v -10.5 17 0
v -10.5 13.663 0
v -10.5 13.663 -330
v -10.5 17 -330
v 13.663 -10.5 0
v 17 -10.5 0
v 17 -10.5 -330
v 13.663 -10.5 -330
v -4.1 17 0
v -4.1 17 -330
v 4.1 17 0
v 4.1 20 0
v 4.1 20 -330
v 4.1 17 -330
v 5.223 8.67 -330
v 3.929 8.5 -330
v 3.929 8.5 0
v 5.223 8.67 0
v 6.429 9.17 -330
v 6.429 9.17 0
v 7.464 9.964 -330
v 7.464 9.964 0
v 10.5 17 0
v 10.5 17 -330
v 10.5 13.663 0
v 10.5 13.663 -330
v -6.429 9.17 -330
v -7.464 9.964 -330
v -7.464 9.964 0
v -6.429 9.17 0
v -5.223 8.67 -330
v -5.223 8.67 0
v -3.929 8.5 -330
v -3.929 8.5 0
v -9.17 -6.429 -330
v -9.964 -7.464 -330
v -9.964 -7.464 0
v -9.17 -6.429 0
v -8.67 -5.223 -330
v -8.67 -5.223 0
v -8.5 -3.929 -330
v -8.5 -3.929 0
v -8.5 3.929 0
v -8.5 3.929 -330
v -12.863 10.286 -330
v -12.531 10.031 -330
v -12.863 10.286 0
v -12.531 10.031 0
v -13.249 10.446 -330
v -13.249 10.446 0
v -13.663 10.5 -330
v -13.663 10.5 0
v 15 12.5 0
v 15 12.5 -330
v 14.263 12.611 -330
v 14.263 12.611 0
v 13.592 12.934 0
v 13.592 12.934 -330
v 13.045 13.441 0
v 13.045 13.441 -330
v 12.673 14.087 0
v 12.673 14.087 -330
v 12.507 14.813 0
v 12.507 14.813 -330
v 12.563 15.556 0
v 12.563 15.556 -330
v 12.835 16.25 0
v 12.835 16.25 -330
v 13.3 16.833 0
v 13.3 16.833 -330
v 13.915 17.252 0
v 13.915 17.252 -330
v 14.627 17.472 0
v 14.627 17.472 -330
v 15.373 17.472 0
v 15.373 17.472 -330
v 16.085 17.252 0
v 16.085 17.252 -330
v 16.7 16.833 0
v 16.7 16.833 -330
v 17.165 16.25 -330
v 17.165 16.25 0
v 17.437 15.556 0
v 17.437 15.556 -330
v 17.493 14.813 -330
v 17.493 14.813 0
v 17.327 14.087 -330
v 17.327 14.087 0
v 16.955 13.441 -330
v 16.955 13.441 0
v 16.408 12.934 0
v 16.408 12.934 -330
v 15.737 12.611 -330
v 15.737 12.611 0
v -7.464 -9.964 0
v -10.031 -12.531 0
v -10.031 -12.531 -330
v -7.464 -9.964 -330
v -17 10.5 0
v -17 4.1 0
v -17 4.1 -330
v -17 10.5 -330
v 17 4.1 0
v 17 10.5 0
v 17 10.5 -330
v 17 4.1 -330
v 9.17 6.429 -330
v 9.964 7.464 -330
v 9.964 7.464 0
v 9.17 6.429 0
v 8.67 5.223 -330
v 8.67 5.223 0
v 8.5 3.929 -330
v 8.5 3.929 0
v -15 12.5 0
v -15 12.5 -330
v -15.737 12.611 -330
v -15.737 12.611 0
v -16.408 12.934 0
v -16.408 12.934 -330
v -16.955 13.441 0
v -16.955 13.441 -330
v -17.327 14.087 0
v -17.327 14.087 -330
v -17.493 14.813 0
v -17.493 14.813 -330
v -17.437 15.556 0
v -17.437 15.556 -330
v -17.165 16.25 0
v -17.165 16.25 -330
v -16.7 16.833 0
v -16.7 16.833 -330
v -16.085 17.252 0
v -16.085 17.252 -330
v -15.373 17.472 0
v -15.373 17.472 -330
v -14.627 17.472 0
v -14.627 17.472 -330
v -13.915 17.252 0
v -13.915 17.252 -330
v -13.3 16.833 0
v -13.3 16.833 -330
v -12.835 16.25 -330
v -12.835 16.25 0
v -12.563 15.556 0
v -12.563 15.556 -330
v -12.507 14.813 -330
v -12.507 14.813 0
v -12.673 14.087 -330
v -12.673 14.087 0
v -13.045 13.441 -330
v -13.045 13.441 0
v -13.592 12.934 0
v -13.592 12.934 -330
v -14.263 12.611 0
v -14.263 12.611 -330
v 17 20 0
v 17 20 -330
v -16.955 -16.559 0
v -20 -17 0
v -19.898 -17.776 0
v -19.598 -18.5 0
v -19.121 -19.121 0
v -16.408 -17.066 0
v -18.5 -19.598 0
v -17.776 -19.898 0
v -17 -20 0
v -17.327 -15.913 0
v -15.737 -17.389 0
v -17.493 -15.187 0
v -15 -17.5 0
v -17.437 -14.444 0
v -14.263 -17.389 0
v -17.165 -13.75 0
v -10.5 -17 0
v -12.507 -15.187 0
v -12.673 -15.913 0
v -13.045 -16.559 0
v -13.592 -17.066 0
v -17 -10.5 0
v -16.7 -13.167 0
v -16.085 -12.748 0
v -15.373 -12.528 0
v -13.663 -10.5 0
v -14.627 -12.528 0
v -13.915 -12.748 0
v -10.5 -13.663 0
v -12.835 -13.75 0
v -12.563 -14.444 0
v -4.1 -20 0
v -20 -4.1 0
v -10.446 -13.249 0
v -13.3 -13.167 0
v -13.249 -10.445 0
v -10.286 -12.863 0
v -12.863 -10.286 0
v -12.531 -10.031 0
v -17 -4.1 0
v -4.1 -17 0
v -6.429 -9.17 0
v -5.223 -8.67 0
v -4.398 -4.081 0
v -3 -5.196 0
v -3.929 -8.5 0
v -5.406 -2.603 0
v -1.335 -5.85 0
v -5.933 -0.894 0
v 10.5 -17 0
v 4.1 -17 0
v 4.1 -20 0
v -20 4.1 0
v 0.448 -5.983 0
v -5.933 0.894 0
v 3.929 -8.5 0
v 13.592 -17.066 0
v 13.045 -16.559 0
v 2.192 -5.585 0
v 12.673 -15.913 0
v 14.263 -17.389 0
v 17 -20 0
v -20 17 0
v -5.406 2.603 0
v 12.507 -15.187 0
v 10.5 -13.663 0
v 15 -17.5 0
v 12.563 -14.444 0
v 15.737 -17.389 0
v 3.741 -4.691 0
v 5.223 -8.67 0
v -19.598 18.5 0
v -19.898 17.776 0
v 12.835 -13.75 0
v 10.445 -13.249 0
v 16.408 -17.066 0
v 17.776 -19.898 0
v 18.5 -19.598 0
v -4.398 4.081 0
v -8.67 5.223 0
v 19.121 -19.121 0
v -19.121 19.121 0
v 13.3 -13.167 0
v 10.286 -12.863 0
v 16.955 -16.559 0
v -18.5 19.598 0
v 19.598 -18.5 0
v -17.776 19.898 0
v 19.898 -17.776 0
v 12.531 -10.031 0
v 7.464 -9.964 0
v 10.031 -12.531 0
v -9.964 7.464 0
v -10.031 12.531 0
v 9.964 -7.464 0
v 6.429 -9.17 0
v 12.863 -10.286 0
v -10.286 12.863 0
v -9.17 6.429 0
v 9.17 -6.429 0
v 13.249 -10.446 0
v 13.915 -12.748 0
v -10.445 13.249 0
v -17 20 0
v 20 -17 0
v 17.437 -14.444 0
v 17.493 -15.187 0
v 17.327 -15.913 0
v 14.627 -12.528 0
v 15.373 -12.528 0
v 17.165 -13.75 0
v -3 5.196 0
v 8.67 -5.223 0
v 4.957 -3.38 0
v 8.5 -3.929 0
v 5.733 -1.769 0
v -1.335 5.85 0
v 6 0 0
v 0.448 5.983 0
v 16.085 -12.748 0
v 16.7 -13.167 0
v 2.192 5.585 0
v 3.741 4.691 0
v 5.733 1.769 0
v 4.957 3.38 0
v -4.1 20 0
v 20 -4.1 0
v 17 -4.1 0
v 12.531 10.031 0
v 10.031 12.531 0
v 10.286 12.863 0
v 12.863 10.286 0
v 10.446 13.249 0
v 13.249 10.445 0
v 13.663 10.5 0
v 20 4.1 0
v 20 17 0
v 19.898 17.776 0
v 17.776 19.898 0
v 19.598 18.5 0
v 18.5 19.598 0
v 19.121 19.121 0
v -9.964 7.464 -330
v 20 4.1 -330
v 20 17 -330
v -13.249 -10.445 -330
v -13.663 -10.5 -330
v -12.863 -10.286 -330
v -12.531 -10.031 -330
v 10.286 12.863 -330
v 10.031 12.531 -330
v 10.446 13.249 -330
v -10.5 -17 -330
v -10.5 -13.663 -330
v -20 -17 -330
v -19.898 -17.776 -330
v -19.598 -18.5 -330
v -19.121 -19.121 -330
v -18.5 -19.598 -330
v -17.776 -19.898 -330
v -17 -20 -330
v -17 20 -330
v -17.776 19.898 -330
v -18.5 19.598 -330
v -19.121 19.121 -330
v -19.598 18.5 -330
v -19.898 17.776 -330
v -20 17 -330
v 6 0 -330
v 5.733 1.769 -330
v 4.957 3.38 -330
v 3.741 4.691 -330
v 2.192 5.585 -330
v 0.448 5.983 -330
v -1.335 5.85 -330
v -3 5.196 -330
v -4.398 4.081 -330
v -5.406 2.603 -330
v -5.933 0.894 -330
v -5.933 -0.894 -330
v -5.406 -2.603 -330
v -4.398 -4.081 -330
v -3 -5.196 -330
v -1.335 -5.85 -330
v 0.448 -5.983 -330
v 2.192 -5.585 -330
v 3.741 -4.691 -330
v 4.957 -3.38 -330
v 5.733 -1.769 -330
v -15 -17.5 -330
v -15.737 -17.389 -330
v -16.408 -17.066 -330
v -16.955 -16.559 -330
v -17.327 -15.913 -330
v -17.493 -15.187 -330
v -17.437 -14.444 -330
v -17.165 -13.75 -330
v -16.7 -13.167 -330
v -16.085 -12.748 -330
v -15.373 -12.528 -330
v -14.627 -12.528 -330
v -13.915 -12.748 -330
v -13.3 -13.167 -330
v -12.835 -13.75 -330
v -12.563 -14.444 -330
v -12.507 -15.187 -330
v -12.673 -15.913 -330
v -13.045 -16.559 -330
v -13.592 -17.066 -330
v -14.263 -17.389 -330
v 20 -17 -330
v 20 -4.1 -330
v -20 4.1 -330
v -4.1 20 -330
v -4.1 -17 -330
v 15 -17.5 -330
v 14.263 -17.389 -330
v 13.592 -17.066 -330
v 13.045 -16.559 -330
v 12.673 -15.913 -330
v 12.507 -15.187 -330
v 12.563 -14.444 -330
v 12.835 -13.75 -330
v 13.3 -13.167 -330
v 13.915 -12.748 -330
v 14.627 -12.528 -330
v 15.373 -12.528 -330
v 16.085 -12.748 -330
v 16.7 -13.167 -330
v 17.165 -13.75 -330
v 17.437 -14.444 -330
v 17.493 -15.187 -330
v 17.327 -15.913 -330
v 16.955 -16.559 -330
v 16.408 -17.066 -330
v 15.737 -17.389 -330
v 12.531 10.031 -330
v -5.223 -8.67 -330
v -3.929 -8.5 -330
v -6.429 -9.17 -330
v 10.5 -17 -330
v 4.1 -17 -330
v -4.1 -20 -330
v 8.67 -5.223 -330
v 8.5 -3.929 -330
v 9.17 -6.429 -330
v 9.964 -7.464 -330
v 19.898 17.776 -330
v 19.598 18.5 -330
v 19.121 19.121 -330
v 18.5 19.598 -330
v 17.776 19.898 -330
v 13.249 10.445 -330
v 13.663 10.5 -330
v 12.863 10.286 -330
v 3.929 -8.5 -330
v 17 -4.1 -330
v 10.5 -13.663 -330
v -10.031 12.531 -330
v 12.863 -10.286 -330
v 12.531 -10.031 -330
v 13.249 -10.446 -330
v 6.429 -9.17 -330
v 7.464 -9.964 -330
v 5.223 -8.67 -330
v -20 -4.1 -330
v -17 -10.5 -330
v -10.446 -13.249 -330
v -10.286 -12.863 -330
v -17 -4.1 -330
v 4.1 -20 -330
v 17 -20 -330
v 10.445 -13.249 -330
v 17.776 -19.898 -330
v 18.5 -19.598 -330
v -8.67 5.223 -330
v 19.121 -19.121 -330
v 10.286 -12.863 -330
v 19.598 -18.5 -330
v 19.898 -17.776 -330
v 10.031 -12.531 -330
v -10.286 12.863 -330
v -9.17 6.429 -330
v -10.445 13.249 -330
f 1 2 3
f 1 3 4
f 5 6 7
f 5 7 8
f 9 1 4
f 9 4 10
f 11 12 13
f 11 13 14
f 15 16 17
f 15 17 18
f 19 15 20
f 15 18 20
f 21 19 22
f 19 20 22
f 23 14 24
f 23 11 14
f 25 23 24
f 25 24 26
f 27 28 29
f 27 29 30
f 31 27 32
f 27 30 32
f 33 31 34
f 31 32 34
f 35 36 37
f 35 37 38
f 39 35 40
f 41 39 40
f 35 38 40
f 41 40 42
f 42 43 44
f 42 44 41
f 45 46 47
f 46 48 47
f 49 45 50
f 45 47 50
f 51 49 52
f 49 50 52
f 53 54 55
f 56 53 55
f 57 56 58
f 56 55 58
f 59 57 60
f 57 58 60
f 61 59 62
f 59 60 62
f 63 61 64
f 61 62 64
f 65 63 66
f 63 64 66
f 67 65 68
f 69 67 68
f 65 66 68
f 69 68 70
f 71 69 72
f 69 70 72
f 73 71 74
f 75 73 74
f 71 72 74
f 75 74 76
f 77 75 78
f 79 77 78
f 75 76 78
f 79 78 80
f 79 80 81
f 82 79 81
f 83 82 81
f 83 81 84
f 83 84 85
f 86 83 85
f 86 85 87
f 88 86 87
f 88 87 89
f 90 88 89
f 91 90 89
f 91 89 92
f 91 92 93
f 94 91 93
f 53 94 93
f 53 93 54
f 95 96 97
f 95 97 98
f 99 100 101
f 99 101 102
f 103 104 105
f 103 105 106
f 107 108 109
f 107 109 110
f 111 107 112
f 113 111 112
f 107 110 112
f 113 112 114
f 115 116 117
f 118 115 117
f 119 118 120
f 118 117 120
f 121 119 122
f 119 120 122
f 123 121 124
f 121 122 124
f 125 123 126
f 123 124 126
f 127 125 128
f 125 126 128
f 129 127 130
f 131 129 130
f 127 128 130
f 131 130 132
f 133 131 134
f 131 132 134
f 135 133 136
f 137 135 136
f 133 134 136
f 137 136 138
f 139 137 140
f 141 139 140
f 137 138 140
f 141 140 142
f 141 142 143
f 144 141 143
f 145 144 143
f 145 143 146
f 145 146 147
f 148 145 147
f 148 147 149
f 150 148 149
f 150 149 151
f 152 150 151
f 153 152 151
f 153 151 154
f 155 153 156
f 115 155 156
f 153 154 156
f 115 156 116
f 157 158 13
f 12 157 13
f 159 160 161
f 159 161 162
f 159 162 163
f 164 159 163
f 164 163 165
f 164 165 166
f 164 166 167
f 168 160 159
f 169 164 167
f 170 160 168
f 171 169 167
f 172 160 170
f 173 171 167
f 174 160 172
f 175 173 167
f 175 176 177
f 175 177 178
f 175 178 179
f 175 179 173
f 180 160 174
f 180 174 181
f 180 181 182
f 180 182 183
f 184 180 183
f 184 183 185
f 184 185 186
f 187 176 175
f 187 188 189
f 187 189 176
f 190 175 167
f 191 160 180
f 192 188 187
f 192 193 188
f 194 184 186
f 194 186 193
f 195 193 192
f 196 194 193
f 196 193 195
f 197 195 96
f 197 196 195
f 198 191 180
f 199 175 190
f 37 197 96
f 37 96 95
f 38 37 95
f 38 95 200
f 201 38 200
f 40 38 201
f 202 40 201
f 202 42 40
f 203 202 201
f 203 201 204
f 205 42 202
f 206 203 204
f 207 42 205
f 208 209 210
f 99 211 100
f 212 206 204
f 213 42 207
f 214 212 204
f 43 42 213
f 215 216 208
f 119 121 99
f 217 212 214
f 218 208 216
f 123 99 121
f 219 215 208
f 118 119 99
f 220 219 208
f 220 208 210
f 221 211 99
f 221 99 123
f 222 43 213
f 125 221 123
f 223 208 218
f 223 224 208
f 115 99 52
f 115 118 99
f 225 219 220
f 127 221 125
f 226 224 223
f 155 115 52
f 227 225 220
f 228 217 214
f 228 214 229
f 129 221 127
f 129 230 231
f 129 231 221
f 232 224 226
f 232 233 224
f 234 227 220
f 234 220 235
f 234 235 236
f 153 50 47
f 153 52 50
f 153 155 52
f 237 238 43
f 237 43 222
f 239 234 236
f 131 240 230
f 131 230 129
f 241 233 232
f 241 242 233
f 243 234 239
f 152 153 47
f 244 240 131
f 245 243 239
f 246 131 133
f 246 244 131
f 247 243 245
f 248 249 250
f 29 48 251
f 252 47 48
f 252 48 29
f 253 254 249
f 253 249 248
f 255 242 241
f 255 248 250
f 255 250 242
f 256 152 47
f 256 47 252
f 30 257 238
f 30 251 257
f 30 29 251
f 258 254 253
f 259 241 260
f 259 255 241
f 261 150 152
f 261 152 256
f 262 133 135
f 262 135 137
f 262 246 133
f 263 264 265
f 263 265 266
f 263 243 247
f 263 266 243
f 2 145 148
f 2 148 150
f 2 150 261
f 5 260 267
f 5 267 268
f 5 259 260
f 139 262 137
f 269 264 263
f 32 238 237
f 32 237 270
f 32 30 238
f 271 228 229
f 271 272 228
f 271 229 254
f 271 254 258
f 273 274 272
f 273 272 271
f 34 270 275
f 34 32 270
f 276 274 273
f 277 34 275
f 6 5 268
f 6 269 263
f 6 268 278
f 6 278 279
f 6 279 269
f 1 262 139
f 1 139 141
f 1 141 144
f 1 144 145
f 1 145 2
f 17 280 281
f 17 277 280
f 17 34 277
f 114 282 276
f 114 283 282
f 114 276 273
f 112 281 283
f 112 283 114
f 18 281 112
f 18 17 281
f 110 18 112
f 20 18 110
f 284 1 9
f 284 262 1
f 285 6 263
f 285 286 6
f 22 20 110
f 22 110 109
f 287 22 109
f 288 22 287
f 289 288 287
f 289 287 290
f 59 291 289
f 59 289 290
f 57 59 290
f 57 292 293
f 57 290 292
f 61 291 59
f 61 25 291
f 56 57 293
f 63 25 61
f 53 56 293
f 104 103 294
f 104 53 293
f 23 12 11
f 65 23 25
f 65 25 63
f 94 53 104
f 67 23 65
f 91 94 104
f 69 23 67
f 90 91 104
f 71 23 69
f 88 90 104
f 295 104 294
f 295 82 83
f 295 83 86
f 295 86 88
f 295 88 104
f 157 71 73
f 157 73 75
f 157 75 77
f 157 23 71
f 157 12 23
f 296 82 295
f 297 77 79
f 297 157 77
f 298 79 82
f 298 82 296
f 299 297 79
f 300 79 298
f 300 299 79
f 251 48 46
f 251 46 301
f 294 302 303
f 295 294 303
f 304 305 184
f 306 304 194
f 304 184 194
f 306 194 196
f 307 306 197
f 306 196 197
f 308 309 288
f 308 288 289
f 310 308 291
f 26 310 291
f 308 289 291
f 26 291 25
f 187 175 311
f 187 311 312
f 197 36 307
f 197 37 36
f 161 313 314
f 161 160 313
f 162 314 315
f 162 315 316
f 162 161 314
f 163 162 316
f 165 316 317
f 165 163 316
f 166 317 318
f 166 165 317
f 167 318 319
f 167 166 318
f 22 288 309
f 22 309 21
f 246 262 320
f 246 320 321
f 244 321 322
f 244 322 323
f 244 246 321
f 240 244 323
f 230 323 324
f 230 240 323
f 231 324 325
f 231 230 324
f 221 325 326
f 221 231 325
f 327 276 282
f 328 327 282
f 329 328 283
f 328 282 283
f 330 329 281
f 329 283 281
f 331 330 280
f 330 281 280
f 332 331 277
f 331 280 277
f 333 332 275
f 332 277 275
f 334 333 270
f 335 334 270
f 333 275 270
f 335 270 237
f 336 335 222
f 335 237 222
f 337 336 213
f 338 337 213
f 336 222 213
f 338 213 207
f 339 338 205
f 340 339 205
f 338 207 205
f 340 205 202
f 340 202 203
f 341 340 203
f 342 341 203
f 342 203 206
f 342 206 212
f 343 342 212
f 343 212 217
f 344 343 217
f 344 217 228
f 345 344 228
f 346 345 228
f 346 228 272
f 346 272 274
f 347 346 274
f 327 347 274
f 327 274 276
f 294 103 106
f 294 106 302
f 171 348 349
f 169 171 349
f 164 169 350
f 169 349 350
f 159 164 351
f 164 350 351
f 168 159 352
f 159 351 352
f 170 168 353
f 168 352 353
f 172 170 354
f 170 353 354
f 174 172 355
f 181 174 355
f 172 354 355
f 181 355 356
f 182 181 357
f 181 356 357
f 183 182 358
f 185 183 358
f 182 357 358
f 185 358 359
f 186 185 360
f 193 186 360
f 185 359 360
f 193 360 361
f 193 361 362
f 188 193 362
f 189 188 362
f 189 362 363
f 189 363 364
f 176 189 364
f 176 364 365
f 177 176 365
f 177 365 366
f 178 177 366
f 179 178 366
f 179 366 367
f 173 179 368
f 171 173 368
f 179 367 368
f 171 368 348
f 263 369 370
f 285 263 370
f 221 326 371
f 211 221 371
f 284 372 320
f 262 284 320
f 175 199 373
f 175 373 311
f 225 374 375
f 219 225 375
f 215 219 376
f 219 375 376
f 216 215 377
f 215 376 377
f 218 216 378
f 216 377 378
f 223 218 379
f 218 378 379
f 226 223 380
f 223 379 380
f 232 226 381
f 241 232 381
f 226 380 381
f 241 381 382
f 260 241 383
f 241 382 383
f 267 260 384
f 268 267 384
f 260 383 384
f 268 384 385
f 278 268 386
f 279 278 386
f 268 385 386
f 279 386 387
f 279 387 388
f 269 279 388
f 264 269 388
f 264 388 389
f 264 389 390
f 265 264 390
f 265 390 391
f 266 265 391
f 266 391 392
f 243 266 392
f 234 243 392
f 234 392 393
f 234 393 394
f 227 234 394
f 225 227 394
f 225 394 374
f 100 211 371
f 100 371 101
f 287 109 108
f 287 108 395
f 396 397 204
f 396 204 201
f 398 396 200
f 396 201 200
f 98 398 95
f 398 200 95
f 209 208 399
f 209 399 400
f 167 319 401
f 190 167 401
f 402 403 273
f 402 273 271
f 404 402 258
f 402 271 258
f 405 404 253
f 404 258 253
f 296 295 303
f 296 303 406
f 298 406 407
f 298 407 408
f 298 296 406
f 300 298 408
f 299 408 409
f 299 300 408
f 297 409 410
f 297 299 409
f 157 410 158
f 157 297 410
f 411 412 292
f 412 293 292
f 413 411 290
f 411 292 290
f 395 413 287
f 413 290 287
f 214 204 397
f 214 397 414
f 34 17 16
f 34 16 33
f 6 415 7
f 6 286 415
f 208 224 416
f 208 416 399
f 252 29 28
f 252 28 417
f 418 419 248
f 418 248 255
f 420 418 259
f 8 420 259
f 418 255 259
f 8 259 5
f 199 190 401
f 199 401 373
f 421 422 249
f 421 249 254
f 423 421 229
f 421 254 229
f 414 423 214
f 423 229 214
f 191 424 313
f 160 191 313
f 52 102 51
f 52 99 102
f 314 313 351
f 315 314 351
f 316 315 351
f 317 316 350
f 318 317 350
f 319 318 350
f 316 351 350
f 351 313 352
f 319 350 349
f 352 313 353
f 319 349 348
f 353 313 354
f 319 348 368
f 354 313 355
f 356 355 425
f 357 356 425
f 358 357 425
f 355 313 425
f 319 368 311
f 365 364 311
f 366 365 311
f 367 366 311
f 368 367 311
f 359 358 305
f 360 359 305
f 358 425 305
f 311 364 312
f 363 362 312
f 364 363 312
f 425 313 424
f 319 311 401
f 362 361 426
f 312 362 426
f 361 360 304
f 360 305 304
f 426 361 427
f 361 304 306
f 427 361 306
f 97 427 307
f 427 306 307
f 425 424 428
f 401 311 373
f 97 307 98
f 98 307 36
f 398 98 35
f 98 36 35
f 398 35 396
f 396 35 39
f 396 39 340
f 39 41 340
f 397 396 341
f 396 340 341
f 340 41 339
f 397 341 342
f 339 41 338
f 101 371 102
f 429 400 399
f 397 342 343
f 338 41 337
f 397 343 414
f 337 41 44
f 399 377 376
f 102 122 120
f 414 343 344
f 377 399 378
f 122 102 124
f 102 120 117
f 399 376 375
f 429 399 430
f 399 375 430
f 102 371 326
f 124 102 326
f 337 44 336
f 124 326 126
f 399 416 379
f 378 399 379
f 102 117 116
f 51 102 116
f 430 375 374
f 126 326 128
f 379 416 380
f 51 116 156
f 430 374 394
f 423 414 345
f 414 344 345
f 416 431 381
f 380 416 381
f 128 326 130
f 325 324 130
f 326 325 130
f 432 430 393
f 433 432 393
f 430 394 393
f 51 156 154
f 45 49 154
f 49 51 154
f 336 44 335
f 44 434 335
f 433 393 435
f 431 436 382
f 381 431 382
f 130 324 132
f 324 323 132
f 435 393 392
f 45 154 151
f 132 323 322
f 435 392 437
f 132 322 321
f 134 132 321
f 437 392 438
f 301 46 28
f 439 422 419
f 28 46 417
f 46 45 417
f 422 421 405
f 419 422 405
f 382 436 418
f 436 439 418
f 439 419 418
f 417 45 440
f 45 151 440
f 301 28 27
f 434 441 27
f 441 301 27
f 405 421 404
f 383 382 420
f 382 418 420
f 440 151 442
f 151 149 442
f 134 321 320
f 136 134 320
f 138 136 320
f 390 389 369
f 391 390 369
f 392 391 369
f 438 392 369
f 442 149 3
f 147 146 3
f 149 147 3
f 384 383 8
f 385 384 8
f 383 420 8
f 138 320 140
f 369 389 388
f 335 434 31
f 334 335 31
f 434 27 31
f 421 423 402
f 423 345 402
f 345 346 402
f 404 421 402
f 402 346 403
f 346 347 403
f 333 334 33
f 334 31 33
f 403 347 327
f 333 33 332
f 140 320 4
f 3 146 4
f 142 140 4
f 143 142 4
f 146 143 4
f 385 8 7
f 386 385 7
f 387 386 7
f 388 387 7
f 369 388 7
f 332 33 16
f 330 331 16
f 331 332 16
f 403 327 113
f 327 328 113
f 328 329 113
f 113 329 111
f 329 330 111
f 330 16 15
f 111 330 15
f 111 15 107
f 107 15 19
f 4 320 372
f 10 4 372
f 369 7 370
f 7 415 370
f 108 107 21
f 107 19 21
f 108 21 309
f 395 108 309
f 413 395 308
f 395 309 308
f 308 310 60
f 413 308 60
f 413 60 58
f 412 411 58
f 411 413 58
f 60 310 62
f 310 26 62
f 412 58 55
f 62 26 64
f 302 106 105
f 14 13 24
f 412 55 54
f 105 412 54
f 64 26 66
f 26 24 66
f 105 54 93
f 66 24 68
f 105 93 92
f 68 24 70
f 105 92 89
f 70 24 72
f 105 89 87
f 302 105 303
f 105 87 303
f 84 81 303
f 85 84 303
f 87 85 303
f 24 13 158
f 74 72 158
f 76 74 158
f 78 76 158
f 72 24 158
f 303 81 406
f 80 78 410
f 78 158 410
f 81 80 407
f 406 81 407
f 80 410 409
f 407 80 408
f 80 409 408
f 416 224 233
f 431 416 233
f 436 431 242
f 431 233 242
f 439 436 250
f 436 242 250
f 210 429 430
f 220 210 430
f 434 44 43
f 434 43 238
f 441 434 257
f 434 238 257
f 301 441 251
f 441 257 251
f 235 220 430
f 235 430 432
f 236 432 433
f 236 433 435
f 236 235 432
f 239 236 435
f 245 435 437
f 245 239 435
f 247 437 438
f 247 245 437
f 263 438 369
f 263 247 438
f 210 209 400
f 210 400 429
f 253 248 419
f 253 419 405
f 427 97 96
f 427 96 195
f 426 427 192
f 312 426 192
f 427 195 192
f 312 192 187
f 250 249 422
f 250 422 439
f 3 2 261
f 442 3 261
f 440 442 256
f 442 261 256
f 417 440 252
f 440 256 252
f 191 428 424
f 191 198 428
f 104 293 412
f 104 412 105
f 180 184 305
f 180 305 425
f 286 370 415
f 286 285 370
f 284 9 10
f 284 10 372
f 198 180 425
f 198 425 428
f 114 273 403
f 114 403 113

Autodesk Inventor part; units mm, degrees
sketch "Skizze_1" plane through (0, 0, 0) normal (0, 0, 1) x (1, 0, 0)
  arc A0 (-20, -17) -> (-17, -20) centre (-17, -17) ccw
  line L0 (-17, -20) -> (-4.1, -20)
  line L1 (-4.1, -20) -> (-4.1, -17)
  line L2 (-4.1, -17) -> (-10.5, -17)
  line L3 (-10.5, -17) -> (-10.5, -13.6627)
  arc A1 (-10.0314, -12.5314) -> (-10.5, -13.6627) centre (-8.9002, -13.6627) ccw
  line L4 (-10.0314, -12.5314) -> (-7.4645, -9.9645)
  arc A2 (-3.9289, -8.5) -> (-7.4645, -9.9645) centre (-3.9289, -13.5) ccw
  line L5 (-3.9289, -8.5) -> (3.9289, -8.5)
  arc A3 (7.4645, -9.9645) -> (3.9289, -8.5) centre (3.9289, -13.5) ccw
  line L6 (7.4645, -9.9645) -> (10.0314, -12.5314)
  arc A4 (10.5, -13.6627) -> (10.0314, -12.5314) centre (8.9002, -13.6627) ccw
  line L7 (10.5, -13.6627) -> (10.5, -17)
  line L8 (10.5, -17) -> (4.1, -17)
  line L9 (4.1, -17) -> (4.1, -20)
  line L10 (4.1, -20) -> (17, -20)
  arc A5 (17, -20) -> (20, -17) centre (17, -17) ccw
  line L11 (20, -17) -> (20, -4.1)
  line L12 (20, -4.1) -> (17, -4.1)
  line L13 (17, -4.1) -> (17, -10.5)
  line L14 (17, -10.5) -> (13.6627, -10.5)
  arc A6 (12.5314, -10.0314) -> (13.6627, -10.5) centre (13.6627, -8.9002) ccw
  line L15 (12.5314, -10.0314) -> (9.9645, -7.4645)
  arc A7 (8.5, -3.9289) -> (9.9645, -7.4645) centre (13.5, -3.9289) ccw
  line L16 (8.5, -3.9289) -> (8.5, 3.9289)
  arc A8 (9.9645, 7.4645) -> (8.5, 3.9289) centre (13.5, 3.9289) ccw
  line L17 (9.9645, 7.4645) -> (12.5314, 10.0314)
  arc A9 (13.6627, 10.5) -> (12.5314, 10.0314) centre (13.6627, 8.9002) ccw
  line L18 (13.6627, 10.5) -> (17, 10.5)
  line L19 (17, 10.5) -> (17, 4.1)
  line L20 (17, 4.1) -> (20, 4.1)
  line L21 (20, 4.1) -> (20, 17)
  arc A10 (20, 17) -> (17, 20) centre (17, 17) ccw
  line L22 (17, 20) -> (4.1, 20)
  line L23 (4.1, 20) -> (4.1, 17)
  line L24 (4.1, 17) -> (10.5, 17)
  line L25 (10.5, 17) -> (10.5, 13.6627)
  arc A11 (10.0314, 12.5314) -> (10.5, 13.6627) centre (8.9002, 13.6627) ccw
  line L26 (10.0314, 12.5314) -> (7.4645, 9.9645)
  arc A12 (3.9289, 8.5) -> (7.4645, 9.9645) centre (3.9289, 13.5) ccw
  line L27 (3.9289, 8.5) -> (-3.9289, 8.5)
  arc A13 (-7.4645, 9.9645) -> (-3.9289, 8.5) centre (-3.9289, 13.5) ccw
  line L28 (-7.4645, 9.9645) -> (-10.0314, 12.5314)
  arc A14 (-10.5, 13.6627) -> (-10.0314, 12.5314) centre (-8.9002, 13.6627) ccw
  line L29 (-10.5, 13.6627) -> (-10.5, 17)
  line L30 (-10.5, 17) -> (-4.1, 17)
  line L31 (-4.1, 17) -> (-4.1, 20)
  line L32 (-4.1, 20) -> (-17, 20)
  arc A15 (-17, 20) -> (-20, 17) centre (-17, 17) ccw
  line L33 (-20, 17) -> (-20, 4.1)
  line L34 (-20, 4.1) -> (-17, 4.1)
  line L35 (-17, 4.1) -> (-17, 10.5)
  line L36 (-17, 10.5) -> (-13.6627, 10.5)
  arc A16 (-12.5314, 10.0314) -> (-13.6627, 10.5) centre (-13.6627, 8.9002) ccw
  line L37 (-12.5314, 10.0314) -> (-9.9645, 7.4645)
  arc A17 (-8.5, 3.9289) -> (-9.9645, 7.4645) centre (-13.5, 3.9289) ccw
  line L38 (-8.5, 3.9289) -> (-8.5, -3.9289)
  arc A18 (-9.9645, -7.4645) -> (-8.5, -3.9289) centre (-13.5, -3.9289) ccw
  line L39 (-9.9645, -7.4645) -> (-12.5314, -10.0314)
  arc A19 (-13.6627, -10.5) -> (-12.5314, -10.0314) centre (-13.6627, -8.9002) ccw
  line L40 (-13.6627, -10.5) -> (-17, -10.5)
  line L41 (-17, -10.5) -> (-17, -4.1)
  line L42 (-17, -4.1) -> (-20, -4.1)
  line L43 (-20, -4.1) -> (-20, -17)
  circle A20 centre (0, 0) radius 6
extrude "Extrusion1" add sketch "Skizze_1" against normal blind 330
sketch "Sketch2" plane through (0, 0, 0) normal (0, 0, 1) x (1, 0, 0)
  point P0 (-15, -15)
hole "Drilling 1" at (-15, -15, 0) direction (0, 0, -1) diameter 5 depth 6000
sketch "Sketch3" plane through (0, 0, 0) normal (0, 0, 1) x (1, 0, 0)
  point P0 (15, -15)
hole "Drilling 2" at (15, -15, 0) direction (0, 0, -1) diameter 5 depth 6000
sketch "Sketch4" plane through (0, 0, 0) normal (0, 0, 1) x (1, 0, 0)
  point P0 (15, 15)
hole "Drilling 3" at (15, 15, 0) direction (0, 0, -1) diameter 5 depth 6000
sketch "Sketch5" plane through (0, 0, 0) normal (0, 0, 1) x (1, 0, 0)
  point P0 (-15, 15)
hole "Drilling 4" at (-15, 15, 0) direction (0, 0, -1) diameter 5 depth 6000
ref_plane "side_4d_XY" through (-20, 0, -165) normal (-1, 0, 0) x (0, 1, 0)
ref_plane "side_4d_YZ" through (-20, 0, -165) normal (0, 1, 0) x (0, 0, -1)
ref_plane "side_4d_ZX" through (-20, 0, -165) normal (0, 0, -1) x (-1, 0, 0)
ref_plane "side_1a_XY" through (0, 20, -165) normal (0, 1, 0) x (1, 0, 0)
ref_plane "side_1a_YZ" through (0, 20, -165) normal (1, 0, 0) x (0, 0, -1)
ref_plane "side_1a_ZX" through (0, 20, -165) normal (0, 0, -1) x (0, 1, 0)
ref_plane "side_2b_XY" through (20, 0, -165) normal (1, 0, 0) x (0, -1, 0)
ref_plane "side_2b_YZ" through (20, 0, -165) normal (0, -1, 0) x (0, 0, -1)
ref_plane "side_2b_ZX" through (20, 0, -165) normal (0, 0, -1) x (1, 0, 0)
ref_plane "side_3c_XY" through (0, -20, -165) normal (0, -1, 0) x (-1, 0, 0)
ref_plane "side_3c_YZ" through (0, -20, -165) normal (-1, 0, 0) x (0, 0, -1)
ref_plane "side_3c_ZX" through (0, -20, -165) normal (0, 0, -1) x (0, -1, 0)
ref_plane "end_XY" through (0, 0, -330) normal (0, 0, -1) x (1, 0, 0)
ref_plane "end_YZ" through (0, 0, -330) normal (1, 0, 0) x (0, -1, 0)
ref_plane "end_ZX" through (0, 0, -330) normal (0, -1, 0) x (0, 0, -1)
ref_plane "start_XY" through (0, 0, 0) normal (0, 0, 1) x (1, 0, 0)
ref_plane "start_YZ" through (0, 0, 0) normal (1, 0, 0) x (0, 1, 0)
ref_plane "start_ZX" through (0, 0, 0) normal (0, 1, 0) x (0, 0, 1)
properties part number "MayTec 1.11.040040.43S_Profile 40x40, 4E, S_330_Detail_(0;0,0,0)"
